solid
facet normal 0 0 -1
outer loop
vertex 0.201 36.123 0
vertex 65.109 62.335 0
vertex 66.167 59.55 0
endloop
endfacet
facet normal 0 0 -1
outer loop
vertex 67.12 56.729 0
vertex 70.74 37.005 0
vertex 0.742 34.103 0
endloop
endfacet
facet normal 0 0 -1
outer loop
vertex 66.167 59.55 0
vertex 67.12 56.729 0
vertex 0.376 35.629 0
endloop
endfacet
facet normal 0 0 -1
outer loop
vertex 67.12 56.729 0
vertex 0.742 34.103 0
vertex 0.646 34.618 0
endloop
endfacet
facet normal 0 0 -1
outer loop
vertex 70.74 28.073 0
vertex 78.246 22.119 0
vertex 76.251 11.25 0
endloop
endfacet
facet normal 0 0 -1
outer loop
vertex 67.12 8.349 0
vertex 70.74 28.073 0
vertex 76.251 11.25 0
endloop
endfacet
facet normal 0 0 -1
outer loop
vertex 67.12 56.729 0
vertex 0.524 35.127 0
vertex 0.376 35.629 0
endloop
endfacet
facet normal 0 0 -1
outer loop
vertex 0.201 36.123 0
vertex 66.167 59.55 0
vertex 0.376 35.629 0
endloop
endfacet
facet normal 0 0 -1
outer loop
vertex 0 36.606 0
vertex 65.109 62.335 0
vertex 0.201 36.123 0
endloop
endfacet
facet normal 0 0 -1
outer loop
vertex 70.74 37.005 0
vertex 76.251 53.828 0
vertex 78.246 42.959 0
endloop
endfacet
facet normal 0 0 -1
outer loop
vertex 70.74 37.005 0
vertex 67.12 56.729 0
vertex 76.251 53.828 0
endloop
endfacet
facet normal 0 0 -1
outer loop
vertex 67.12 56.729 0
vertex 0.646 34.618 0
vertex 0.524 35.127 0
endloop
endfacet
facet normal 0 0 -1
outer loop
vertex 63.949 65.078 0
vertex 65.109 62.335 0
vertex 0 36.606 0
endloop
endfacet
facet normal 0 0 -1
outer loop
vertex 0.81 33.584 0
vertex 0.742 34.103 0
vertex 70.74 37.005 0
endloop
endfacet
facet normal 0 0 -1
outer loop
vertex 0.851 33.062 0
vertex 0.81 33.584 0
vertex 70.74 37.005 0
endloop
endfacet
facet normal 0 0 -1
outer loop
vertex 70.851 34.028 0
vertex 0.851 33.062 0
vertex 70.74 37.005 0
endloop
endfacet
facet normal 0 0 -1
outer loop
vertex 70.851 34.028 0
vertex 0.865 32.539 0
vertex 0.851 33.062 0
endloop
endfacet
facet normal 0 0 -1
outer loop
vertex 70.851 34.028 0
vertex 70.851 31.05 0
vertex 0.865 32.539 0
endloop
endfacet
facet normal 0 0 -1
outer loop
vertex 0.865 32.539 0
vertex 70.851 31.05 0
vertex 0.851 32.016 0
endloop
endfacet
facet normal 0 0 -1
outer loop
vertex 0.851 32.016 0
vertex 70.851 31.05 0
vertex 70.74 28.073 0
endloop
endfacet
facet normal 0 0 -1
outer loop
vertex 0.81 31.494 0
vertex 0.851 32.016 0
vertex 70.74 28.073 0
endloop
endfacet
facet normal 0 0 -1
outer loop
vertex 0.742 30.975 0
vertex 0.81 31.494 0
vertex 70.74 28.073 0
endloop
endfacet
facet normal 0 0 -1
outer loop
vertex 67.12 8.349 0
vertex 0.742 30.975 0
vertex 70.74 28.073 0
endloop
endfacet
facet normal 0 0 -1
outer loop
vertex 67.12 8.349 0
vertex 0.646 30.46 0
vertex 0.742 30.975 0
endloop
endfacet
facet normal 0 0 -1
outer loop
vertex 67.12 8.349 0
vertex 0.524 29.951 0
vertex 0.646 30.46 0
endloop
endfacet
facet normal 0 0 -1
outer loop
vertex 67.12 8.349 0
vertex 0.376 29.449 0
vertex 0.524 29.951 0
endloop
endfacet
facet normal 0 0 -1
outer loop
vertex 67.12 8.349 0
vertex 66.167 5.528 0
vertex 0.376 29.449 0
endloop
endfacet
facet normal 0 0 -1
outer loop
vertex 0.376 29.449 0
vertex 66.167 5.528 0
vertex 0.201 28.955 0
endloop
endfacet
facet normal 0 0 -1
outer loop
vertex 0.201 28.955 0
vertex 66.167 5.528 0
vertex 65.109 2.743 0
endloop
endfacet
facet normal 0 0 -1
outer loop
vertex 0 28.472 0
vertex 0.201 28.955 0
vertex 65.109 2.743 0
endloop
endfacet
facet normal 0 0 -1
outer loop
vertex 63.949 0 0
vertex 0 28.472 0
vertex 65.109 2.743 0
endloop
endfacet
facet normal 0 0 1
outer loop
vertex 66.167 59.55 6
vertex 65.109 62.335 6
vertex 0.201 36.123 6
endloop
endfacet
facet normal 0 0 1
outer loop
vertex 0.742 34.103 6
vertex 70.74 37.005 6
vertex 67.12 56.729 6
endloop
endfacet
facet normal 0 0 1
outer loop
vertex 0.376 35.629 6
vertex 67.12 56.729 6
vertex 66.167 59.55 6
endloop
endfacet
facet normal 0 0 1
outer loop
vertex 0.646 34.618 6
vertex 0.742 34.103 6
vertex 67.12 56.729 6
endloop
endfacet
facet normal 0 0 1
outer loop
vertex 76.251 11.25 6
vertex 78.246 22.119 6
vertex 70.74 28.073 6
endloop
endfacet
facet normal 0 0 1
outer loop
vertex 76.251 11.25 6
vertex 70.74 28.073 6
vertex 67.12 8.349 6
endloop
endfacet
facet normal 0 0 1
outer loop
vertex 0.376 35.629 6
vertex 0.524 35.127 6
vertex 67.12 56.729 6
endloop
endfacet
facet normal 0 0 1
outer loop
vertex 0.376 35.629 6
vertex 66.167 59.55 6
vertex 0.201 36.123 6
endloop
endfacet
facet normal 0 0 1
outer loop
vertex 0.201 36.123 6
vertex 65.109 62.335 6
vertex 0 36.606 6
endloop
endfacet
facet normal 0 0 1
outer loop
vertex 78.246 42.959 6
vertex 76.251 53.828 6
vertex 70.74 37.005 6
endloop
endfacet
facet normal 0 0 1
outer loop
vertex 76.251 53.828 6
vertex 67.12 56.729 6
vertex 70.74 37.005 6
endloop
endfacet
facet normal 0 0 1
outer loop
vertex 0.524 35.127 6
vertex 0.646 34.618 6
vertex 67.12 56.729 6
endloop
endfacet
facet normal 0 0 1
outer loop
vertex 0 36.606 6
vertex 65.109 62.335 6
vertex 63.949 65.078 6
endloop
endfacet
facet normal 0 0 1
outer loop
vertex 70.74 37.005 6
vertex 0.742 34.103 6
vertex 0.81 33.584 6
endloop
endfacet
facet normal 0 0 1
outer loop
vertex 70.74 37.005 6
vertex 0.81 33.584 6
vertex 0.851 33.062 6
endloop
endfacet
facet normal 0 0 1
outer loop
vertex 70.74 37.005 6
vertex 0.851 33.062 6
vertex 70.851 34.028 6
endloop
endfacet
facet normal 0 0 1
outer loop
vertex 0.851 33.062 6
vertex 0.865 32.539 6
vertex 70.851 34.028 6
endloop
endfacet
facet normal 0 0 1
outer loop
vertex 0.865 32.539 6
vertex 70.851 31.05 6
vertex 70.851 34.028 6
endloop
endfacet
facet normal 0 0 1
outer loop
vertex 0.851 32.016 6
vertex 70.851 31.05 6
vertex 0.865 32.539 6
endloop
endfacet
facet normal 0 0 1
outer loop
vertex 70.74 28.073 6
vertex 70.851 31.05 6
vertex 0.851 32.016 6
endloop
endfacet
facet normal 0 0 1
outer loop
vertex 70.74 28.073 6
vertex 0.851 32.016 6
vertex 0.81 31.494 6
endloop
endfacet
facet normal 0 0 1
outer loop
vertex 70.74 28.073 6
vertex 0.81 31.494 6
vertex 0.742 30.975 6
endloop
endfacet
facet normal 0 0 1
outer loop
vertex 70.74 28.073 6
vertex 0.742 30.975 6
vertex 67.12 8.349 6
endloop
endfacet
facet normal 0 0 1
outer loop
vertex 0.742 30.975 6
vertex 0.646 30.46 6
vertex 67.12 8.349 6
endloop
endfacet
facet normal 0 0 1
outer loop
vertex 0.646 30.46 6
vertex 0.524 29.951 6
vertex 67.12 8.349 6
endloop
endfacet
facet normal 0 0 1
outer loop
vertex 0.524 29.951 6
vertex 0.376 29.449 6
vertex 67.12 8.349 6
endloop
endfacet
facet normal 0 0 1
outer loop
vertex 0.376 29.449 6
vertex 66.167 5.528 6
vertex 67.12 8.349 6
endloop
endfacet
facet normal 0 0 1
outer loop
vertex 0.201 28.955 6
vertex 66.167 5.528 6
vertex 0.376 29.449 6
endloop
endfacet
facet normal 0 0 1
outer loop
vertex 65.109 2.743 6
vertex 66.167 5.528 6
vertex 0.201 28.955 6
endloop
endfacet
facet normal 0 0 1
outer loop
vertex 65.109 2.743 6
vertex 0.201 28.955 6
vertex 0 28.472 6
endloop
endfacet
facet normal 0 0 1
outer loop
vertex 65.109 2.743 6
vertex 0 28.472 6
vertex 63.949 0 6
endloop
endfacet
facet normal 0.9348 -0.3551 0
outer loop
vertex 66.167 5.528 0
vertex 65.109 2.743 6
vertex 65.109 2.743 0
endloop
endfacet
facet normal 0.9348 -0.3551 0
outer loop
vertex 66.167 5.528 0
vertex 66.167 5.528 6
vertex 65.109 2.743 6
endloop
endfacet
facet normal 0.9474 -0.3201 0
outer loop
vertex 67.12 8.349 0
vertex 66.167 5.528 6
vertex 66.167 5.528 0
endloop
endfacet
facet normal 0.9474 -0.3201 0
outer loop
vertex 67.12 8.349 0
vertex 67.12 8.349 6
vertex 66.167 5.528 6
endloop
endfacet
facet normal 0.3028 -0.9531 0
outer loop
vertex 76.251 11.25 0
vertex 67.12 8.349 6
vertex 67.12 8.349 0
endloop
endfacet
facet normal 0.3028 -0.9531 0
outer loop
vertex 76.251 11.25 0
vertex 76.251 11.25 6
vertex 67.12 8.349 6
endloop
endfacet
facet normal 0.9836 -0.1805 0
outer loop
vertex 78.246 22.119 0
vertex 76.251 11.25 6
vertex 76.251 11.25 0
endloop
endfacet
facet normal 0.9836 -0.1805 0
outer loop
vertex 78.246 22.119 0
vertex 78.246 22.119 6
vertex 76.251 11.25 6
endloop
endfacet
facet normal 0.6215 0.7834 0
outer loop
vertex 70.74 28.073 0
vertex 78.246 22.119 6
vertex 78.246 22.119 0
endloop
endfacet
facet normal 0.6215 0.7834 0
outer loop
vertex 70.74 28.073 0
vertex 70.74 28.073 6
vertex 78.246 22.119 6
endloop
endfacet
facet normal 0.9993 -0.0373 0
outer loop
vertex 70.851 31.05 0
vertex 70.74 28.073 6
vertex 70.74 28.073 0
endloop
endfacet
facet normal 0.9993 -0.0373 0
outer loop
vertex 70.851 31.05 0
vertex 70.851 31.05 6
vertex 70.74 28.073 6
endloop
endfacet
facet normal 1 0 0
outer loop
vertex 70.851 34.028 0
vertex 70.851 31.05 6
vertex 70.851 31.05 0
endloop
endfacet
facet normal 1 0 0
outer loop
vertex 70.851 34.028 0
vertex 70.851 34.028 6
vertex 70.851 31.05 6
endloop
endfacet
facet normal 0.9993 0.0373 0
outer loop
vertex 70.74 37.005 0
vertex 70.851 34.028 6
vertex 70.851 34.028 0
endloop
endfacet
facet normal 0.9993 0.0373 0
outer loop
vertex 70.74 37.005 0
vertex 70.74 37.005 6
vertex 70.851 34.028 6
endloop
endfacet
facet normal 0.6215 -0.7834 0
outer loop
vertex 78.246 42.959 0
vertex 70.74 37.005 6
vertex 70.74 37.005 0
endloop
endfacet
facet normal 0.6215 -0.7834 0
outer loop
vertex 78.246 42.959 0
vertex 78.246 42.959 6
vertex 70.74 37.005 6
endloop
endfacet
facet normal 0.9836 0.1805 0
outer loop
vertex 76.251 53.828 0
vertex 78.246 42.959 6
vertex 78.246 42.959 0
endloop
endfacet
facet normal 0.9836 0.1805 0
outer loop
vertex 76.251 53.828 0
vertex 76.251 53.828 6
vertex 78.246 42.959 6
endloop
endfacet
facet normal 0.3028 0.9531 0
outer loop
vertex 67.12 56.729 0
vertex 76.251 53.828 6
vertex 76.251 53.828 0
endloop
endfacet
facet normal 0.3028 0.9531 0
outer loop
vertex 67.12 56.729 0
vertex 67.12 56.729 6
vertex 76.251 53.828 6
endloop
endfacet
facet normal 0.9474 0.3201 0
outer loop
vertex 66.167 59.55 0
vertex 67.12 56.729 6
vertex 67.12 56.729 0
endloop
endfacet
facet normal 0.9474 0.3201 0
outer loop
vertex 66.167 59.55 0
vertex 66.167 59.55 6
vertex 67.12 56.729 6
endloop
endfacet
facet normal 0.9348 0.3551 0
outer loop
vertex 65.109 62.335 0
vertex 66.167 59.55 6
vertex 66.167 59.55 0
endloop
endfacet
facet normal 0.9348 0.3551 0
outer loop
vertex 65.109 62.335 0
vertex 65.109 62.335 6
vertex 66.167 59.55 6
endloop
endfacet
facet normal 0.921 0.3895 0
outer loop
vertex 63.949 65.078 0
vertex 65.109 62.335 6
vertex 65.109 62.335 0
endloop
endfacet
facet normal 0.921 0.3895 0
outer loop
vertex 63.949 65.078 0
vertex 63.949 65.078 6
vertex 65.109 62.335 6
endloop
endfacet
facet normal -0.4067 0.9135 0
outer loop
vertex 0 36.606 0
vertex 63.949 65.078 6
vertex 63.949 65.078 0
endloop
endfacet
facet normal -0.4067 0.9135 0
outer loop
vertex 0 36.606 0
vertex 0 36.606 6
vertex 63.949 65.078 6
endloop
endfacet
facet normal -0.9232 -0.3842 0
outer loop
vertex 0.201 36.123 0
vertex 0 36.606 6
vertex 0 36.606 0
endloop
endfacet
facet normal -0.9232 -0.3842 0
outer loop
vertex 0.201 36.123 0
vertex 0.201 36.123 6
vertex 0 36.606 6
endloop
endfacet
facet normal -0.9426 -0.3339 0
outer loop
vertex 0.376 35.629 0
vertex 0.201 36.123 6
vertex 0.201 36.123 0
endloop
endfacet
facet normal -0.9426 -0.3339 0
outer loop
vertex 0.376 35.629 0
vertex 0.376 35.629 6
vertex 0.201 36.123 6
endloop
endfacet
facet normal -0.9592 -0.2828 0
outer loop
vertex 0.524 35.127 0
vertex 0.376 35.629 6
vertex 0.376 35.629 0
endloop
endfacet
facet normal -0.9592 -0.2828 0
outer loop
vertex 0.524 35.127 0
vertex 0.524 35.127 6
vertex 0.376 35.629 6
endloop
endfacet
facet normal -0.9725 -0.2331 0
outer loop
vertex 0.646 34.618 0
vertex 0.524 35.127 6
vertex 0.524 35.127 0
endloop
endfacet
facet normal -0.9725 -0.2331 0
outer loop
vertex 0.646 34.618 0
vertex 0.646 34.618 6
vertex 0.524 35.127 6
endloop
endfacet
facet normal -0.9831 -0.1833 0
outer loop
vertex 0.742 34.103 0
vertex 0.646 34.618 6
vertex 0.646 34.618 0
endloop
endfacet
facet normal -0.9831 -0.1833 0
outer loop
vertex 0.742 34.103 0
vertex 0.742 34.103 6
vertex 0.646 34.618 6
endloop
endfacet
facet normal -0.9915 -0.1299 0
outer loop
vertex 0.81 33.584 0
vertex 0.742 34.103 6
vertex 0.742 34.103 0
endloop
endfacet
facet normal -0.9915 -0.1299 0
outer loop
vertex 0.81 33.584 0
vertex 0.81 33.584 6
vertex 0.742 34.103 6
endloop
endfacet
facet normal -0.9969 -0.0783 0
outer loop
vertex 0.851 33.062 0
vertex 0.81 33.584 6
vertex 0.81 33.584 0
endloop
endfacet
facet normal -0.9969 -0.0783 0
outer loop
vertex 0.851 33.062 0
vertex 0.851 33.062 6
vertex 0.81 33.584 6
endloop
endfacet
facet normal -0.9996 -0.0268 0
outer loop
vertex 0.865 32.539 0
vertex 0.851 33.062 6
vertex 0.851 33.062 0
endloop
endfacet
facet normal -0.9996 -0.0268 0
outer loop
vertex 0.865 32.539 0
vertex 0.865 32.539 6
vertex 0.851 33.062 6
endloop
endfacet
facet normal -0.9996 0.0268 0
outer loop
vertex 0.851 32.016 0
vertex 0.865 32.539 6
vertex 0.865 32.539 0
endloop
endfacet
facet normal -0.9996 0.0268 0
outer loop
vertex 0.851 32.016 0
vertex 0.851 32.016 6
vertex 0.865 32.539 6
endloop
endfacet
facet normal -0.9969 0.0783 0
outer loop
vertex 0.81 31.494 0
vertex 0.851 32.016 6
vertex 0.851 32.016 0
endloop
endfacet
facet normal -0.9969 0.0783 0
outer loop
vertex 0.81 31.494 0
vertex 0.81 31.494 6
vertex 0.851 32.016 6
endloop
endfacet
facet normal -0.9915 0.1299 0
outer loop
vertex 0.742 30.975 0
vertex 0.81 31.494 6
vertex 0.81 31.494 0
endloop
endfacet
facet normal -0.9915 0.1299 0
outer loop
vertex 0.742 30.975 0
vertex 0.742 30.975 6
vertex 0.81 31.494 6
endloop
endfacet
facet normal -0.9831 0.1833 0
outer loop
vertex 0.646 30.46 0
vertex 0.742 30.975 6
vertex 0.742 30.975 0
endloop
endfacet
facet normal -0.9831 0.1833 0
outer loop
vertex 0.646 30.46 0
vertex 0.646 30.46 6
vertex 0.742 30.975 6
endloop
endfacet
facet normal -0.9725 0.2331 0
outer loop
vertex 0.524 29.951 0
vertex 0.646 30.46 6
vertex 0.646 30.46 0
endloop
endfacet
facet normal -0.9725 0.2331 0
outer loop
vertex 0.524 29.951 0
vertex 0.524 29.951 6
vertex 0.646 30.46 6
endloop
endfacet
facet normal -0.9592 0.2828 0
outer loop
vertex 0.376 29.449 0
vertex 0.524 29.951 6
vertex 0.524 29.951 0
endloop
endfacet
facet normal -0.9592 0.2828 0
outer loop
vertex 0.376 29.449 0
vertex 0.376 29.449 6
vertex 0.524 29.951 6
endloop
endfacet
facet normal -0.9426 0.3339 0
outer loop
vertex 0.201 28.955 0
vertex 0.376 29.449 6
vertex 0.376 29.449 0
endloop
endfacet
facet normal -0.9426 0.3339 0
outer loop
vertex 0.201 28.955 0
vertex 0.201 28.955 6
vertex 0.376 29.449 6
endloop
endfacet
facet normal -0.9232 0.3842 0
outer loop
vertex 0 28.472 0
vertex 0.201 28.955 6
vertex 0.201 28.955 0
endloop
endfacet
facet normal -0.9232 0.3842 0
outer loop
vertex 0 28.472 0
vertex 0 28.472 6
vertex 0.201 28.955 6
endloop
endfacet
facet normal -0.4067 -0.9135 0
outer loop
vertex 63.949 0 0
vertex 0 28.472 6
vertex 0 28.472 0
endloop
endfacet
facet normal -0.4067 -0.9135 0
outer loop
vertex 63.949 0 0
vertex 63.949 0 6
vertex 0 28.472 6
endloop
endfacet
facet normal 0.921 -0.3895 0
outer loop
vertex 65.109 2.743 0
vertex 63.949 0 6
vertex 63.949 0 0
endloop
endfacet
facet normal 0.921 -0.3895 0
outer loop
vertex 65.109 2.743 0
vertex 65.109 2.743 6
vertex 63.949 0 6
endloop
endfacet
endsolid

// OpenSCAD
$fn = 32;

// ----------------------------------------------------------------------
// Gear sector: 2 teeth on 48 degrees
// ----------------------------------------------------------------------

// --- parameters (mm) ---
sector_angle = 48;        // sector angle, degrees
root_r = 80;              // root circle radius
tooth_h = 8;              // tooth height over the root circle
teeth = 2;                // number of teeth on the sector
hub_r = 10;               // hub bore radius
plate_t = 6;              // sector thickness, Z
arc_step = 3;             // sampling step of the root/hub arcs, degrees

tip_r = root_r + tooth_h;  // tip circle radius

profile = [[63.949, 0], [65.109, 2.743], [66.167, 5.528], [67.12, 8.349], [76.251, 11.25], [78.246, 22.119], [70.74, 28.073], [70.851, 31.05], [70.851, 34.028], [70.74, 37.005], [78.246, 42.959], [76.251, 53.828], [67.12, 56.729], [66.167, 59.55], [65.109, 62.335], [63.949, 65.078], [0, 36.606], [0.201, 36.123], [0.376, 35.629], [0.524, 35.127], [0.646, 34.618], [0.742, 34.103], [0.81, 33.584], [0.851, 33.062], [0.865, 32.539], [0.851, 32.016], [0.81, 31.494], [0.742, 30.975], [0.646, 30.46], [0.524, 29.951], [0.376, 29.449], [0.201, 28.955], [0, 28.472]];  // primary outline, 33 points, counter clockwise

// --- the one profile operation ---
linear_extrude(height = plate_t) polygon(points = profile);
